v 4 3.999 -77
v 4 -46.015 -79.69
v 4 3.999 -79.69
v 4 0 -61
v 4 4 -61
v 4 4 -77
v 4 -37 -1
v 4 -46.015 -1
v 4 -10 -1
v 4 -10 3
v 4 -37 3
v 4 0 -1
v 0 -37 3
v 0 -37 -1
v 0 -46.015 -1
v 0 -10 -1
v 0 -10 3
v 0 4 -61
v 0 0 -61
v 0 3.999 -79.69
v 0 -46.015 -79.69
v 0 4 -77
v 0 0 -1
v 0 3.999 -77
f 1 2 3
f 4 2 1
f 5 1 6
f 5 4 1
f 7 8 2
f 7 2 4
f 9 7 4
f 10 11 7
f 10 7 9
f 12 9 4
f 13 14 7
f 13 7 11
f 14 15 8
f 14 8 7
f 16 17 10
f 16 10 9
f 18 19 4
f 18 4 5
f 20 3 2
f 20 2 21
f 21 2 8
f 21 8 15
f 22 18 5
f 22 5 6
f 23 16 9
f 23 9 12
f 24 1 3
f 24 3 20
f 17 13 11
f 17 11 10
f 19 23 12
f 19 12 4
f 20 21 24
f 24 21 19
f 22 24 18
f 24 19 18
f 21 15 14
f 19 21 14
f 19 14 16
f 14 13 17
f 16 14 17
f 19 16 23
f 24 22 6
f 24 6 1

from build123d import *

# Parameters (mm, degrees)
BOSS_EXTRUDE1_DEPTH     = 4
CUT_EXTRUDE1_DEPTH      = 10
CUT_EXTRUDE1_DEPTH_BACK = 10
SKETCH4_W               = 4
SKETCH4_H               = 50.01485274
BOSS_EXTRUDE3_DEPTH     = 2.69


with BuildPart() as part:
    # Sketch2 → Boss-Extrude1 (new body)
    with BuildSketch(Plane(origin=(0, 0, 0), x_dir=(0, 0, -1), z_dir=(1, 0, 0))):
        Polygon((61, 4), (101, 4), (101, 0), (161.781661072, 0), (161.781661072, -10), (165.781661072, -10), (165.781661072, -37), (161.781661072, -37), (161.781661072, -46.015400021), (1, -46.015400021), (1, -37), (-3, -37), (-3, -10), (1, -10), (1, 0), (61, 0), align=None)
    extrude(amount=BOSS_EXTRUDE1_DEPTH)

    # Sketch3 → Cut-Extrude1 (cut, two sides: drawn at the far end of the back side and taken through both)
    with BuildSketch(Plane(origin=(0, 0, 0), x_dir=(0, 0, -1), z_dir=(1, 0, 0)).offset(-CUT_EXTRUDE1_DEPTH_BACK)):
        Polygon((77, 4.594080923), (187.139354616, 4.594080923), (187.139354616, -56.777475016), (77, -56.777475016), (77, -46.986682045), align=None)
    extrude(amount=CUT_EXTRUDE1_DEPTH + CUT_EXTRUDE1_DEPTH_BACK, mode=Mode.SUBTRACT)

    # Sketch4 → Boss-Extrude3 (add)
    with BuildSketch(Plane(origin=(0, 0, -77), x_dir=(-1, 0, 0), z_dir=(0, 0, -1))):
        with Locations((-2, -21.007973651)):
            Rectangle(SKETCH4_W, SKETCH4_H)
    extrude(amount=BOSS_EXTRUDE3_DEPTH)


solid = part.part
